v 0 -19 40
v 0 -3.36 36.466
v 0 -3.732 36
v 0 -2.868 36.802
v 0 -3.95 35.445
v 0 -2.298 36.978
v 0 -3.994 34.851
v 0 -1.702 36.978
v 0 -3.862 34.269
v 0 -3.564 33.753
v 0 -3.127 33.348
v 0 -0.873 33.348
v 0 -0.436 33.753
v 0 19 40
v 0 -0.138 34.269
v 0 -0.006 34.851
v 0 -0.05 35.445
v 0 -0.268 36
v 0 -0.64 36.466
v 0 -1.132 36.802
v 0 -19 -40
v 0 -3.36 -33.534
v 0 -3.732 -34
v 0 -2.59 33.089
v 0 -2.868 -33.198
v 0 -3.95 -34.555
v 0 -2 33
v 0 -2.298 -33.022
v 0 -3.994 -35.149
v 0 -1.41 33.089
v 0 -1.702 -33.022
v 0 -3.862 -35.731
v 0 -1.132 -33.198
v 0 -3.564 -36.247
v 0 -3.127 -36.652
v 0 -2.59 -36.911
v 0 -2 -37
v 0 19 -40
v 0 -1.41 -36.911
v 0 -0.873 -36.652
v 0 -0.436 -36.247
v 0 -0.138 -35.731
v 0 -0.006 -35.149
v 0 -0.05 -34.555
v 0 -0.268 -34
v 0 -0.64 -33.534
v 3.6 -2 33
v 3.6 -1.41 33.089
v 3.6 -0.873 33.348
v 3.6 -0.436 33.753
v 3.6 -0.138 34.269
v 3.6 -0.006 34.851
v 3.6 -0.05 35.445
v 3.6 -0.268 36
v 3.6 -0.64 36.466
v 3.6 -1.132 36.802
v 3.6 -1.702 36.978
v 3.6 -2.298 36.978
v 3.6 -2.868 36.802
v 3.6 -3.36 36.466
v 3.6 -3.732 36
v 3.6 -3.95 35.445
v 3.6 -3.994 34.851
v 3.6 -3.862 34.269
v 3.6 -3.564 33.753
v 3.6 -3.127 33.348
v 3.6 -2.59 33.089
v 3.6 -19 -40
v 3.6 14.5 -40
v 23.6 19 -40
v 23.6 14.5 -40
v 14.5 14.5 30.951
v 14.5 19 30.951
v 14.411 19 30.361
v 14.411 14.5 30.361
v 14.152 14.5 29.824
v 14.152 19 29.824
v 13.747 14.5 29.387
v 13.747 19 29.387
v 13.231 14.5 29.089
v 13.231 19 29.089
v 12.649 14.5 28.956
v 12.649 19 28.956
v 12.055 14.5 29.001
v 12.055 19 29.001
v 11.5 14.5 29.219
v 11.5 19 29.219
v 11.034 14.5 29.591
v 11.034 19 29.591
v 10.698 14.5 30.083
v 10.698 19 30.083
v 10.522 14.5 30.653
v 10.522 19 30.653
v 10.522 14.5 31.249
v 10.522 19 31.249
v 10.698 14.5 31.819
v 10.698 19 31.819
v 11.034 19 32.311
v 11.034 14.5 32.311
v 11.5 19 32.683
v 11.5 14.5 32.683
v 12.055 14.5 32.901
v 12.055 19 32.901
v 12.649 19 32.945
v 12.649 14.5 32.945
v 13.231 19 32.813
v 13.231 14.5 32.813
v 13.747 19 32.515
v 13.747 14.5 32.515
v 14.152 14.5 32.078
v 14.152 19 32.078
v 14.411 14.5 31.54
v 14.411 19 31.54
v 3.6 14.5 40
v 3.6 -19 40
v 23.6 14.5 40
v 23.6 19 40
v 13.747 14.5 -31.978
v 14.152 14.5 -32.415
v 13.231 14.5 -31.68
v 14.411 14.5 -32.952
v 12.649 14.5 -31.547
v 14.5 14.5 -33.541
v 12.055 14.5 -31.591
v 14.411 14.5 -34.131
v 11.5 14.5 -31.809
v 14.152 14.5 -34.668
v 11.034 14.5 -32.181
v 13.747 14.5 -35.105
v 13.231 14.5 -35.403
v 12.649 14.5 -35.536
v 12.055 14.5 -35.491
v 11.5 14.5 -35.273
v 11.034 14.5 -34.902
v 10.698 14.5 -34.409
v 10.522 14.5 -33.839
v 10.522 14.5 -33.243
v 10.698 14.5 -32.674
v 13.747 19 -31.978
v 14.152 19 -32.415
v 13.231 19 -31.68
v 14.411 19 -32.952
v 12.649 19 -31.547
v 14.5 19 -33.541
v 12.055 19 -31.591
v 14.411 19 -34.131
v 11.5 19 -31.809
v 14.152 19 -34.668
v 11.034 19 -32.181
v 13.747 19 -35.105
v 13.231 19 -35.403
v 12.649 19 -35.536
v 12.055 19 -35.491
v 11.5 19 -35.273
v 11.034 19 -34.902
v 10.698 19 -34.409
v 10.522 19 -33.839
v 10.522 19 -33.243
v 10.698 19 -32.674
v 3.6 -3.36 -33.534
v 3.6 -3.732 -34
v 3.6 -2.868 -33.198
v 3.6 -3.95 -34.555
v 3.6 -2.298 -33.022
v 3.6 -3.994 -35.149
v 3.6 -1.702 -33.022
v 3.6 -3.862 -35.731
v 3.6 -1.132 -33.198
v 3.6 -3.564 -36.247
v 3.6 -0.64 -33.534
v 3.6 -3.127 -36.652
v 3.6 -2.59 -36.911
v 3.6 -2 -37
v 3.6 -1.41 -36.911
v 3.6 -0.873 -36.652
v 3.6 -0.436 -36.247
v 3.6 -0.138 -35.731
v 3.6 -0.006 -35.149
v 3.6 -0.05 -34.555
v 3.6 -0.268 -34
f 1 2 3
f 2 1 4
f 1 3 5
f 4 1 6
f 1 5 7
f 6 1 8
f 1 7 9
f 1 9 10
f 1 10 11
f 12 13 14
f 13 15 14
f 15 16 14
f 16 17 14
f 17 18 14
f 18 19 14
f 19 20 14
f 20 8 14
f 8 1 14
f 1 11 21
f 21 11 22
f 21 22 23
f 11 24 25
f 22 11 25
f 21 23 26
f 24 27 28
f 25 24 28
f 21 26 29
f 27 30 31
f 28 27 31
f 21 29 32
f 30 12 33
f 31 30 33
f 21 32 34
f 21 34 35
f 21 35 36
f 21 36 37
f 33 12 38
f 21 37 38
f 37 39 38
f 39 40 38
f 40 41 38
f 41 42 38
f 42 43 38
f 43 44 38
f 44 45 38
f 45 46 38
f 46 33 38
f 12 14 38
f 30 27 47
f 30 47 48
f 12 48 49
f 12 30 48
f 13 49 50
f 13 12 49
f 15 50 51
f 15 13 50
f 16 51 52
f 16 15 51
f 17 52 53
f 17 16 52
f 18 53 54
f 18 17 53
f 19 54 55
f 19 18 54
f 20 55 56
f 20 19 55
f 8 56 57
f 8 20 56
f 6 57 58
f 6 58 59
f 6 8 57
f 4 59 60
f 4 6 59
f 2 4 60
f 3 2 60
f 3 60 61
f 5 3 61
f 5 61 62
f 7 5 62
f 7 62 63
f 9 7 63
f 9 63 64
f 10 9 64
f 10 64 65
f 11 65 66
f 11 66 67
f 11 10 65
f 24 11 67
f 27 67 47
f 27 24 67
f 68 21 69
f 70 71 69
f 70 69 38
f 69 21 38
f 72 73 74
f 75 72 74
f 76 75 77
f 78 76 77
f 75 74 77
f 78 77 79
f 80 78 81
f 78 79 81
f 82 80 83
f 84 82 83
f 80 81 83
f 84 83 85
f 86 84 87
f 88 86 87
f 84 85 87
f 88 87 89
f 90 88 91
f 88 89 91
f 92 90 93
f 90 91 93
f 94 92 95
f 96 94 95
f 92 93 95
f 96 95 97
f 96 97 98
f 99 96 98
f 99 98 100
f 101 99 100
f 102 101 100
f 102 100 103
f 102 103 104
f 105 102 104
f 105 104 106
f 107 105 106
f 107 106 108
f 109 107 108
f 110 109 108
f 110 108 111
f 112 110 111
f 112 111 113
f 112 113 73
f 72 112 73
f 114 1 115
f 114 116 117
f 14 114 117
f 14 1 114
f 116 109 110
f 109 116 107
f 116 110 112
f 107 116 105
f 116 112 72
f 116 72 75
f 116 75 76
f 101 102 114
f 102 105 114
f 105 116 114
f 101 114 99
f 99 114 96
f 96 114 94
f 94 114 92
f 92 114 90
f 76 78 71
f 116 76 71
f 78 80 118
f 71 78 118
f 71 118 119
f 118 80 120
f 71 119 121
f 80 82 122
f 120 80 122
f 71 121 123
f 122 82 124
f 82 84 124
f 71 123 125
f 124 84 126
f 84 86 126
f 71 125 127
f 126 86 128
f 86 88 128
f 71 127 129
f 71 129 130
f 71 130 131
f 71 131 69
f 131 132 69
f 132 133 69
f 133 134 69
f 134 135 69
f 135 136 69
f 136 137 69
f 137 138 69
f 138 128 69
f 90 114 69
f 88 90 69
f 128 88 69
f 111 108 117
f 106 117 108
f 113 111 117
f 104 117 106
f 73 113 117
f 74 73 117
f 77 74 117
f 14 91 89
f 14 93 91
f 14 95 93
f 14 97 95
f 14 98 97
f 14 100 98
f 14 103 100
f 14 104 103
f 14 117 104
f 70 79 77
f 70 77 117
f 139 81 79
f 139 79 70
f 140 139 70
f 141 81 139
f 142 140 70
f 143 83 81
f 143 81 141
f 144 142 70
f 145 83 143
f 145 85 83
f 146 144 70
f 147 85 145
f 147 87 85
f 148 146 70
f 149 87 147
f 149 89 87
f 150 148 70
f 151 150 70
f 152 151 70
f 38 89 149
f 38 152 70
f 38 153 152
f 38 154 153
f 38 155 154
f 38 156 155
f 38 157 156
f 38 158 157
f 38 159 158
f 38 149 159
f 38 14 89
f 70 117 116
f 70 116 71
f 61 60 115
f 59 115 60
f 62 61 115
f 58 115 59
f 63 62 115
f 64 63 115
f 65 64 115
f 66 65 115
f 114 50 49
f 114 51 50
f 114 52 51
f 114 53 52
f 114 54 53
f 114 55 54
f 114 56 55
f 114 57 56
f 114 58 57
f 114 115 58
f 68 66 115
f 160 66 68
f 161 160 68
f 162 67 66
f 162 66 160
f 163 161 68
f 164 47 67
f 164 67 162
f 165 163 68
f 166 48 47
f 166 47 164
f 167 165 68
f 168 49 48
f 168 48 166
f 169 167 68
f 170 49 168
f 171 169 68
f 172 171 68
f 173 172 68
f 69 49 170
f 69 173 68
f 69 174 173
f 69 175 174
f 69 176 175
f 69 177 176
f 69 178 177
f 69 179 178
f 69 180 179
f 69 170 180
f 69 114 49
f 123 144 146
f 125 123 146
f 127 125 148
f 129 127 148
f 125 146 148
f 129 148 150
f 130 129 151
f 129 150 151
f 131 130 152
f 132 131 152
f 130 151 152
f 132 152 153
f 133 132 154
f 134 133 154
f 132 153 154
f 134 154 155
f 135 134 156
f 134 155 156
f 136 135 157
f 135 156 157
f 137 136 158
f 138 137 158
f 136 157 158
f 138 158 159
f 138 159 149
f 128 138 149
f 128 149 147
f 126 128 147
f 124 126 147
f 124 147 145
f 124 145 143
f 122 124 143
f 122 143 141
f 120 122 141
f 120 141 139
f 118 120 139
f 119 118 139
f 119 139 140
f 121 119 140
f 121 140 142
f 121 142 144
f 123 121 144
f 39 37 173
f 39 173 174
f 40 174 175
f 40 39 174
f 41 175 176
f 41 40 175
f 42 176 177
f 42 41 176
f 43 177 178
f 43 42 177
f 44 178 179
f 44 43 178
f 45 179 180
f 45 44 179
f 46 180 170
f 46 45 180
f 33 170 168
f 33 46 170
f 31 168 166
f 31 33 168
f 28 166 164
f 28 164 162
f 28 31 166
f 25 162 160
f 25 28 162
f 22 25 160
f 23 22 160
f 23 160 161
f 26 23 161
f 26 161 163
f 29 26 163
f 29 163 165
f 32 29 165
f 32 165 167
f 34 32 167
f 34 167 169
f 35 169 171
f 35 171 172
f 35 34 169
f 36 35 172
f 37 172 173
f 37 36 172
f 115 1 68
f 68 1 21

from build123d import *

# Parameters (mm, degrees)
SKETCH1_W           = 80
SKETCH1_H           = 4.5
BOSS_EXTRUDE1_DEPTH = 23.6
SKETCH1_4_W         = 80
SKETCH1_4_H         = 33.5
SKETCH1_4_R         = 2
BOSS_EXTRUDE2_DEPTH = 3.6
CUT_EXTRUDE1_REACH  = 62.008
SKETCH2_R           = 2


with BuildPart() as part:
    # Sketch1 → Boss-Extrude1 (new body)
    with BuildSketch(Plane(origin=(0, 0, 0), x_dir=(0, 0, -1), z_dir=(1, 0, 0))):
        with Locations((0, 16.75)):
            Rectangle(SKETCH1_W, SKETCH1_H)
    extrude(amount=BOSS_EXTRUDE1_DEPTH)

    # Sketch1<4> → Boss-Extrude2 (add)
    with BuildSketch(Plane(origin=(0, 0, 0), x_dir=(0, 0, -1), z_dir=(1, 0, 0))):
        with Locations((0, -2.25)):
            Rectangle(SKETCH1_4_W, SKETCH1_4_H)
        with Locations((-35, -2)):
            Circle(SKETCH1_4_R, mode=Mode.SUBTRACT)
        with Locations((35, -2)):
            Circle(SKETCH1_4_R, mode=Mode.SUBTRACT)
    extrude(amount=BOSS_EXTRUDE2_DEPTH)

    # Sketch2 → Cut-Extrude1 (cut, up to next)
    with BuildSketch(Plane(origin=(0, 19, 0), x_dir=(1, 0, 0), z_dir=(0, 1, 0)), mode=Mode.PRIVATE) as cut_extrude1_sk1:
        with Locations((12.5, 33.54131816)):
            Circle(SKETCH2_R)
    cut_extrude1_tool1 = extrude(cut_extrude1_sk1.sketch, amount=-CUT_EXTRUDE1_REACH, mode=Mode.PRIVATE) & part.part
    # Sketch2 → Cut-Extrude1 (cut, up to next)
    with BuildSketch(Plane(origin=(0, 19, 0), x_dir=(1, 0, 0), z_dir=(0, 1, 0)), mode=Mode.PRIVATE) as cut_extrude1_sk2:
        with Locations((12.5, -30.950875555)):
            Circle(SKETCH2_R)
    cut_extrude1_tool2 = extrude(cut_extrude1_sk2.sketch, amount=-CUT_EXTRUDE1_REACH, mode=Mode.PRIVATE) & part.part
    add(cut_extrude1_tool1.solids().sort_by_distance((12.5, 19, -33.541318))[0], mode=Mode.SUBTRACT)
    add(cut_extrude1_tool2.solids().sort_by_distance((12.5, 19, 30.950876))[0], mode=Mode.SUBTRACT)


solid = part.part
